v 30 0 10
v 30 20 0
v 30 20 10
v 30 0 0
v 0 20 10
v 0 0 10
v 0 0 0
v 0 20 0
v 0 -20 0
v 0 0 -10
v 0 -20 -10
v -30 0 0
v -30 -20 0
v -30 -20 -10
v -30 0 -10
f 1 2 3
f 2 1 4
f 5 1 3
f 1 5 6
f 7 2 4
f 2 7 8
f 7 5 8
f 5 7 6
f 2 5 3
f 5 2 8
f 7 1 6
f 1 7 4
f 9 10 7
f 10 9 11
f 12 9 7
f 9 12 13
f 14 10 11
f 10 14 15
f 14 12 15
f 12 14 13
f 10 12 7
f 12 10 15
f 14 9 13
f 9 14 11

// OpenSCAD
module mycube()
{
  cube(size = [30,20,10]);
}

mycube();

translate([-30,-20,-10])
  mycube();
